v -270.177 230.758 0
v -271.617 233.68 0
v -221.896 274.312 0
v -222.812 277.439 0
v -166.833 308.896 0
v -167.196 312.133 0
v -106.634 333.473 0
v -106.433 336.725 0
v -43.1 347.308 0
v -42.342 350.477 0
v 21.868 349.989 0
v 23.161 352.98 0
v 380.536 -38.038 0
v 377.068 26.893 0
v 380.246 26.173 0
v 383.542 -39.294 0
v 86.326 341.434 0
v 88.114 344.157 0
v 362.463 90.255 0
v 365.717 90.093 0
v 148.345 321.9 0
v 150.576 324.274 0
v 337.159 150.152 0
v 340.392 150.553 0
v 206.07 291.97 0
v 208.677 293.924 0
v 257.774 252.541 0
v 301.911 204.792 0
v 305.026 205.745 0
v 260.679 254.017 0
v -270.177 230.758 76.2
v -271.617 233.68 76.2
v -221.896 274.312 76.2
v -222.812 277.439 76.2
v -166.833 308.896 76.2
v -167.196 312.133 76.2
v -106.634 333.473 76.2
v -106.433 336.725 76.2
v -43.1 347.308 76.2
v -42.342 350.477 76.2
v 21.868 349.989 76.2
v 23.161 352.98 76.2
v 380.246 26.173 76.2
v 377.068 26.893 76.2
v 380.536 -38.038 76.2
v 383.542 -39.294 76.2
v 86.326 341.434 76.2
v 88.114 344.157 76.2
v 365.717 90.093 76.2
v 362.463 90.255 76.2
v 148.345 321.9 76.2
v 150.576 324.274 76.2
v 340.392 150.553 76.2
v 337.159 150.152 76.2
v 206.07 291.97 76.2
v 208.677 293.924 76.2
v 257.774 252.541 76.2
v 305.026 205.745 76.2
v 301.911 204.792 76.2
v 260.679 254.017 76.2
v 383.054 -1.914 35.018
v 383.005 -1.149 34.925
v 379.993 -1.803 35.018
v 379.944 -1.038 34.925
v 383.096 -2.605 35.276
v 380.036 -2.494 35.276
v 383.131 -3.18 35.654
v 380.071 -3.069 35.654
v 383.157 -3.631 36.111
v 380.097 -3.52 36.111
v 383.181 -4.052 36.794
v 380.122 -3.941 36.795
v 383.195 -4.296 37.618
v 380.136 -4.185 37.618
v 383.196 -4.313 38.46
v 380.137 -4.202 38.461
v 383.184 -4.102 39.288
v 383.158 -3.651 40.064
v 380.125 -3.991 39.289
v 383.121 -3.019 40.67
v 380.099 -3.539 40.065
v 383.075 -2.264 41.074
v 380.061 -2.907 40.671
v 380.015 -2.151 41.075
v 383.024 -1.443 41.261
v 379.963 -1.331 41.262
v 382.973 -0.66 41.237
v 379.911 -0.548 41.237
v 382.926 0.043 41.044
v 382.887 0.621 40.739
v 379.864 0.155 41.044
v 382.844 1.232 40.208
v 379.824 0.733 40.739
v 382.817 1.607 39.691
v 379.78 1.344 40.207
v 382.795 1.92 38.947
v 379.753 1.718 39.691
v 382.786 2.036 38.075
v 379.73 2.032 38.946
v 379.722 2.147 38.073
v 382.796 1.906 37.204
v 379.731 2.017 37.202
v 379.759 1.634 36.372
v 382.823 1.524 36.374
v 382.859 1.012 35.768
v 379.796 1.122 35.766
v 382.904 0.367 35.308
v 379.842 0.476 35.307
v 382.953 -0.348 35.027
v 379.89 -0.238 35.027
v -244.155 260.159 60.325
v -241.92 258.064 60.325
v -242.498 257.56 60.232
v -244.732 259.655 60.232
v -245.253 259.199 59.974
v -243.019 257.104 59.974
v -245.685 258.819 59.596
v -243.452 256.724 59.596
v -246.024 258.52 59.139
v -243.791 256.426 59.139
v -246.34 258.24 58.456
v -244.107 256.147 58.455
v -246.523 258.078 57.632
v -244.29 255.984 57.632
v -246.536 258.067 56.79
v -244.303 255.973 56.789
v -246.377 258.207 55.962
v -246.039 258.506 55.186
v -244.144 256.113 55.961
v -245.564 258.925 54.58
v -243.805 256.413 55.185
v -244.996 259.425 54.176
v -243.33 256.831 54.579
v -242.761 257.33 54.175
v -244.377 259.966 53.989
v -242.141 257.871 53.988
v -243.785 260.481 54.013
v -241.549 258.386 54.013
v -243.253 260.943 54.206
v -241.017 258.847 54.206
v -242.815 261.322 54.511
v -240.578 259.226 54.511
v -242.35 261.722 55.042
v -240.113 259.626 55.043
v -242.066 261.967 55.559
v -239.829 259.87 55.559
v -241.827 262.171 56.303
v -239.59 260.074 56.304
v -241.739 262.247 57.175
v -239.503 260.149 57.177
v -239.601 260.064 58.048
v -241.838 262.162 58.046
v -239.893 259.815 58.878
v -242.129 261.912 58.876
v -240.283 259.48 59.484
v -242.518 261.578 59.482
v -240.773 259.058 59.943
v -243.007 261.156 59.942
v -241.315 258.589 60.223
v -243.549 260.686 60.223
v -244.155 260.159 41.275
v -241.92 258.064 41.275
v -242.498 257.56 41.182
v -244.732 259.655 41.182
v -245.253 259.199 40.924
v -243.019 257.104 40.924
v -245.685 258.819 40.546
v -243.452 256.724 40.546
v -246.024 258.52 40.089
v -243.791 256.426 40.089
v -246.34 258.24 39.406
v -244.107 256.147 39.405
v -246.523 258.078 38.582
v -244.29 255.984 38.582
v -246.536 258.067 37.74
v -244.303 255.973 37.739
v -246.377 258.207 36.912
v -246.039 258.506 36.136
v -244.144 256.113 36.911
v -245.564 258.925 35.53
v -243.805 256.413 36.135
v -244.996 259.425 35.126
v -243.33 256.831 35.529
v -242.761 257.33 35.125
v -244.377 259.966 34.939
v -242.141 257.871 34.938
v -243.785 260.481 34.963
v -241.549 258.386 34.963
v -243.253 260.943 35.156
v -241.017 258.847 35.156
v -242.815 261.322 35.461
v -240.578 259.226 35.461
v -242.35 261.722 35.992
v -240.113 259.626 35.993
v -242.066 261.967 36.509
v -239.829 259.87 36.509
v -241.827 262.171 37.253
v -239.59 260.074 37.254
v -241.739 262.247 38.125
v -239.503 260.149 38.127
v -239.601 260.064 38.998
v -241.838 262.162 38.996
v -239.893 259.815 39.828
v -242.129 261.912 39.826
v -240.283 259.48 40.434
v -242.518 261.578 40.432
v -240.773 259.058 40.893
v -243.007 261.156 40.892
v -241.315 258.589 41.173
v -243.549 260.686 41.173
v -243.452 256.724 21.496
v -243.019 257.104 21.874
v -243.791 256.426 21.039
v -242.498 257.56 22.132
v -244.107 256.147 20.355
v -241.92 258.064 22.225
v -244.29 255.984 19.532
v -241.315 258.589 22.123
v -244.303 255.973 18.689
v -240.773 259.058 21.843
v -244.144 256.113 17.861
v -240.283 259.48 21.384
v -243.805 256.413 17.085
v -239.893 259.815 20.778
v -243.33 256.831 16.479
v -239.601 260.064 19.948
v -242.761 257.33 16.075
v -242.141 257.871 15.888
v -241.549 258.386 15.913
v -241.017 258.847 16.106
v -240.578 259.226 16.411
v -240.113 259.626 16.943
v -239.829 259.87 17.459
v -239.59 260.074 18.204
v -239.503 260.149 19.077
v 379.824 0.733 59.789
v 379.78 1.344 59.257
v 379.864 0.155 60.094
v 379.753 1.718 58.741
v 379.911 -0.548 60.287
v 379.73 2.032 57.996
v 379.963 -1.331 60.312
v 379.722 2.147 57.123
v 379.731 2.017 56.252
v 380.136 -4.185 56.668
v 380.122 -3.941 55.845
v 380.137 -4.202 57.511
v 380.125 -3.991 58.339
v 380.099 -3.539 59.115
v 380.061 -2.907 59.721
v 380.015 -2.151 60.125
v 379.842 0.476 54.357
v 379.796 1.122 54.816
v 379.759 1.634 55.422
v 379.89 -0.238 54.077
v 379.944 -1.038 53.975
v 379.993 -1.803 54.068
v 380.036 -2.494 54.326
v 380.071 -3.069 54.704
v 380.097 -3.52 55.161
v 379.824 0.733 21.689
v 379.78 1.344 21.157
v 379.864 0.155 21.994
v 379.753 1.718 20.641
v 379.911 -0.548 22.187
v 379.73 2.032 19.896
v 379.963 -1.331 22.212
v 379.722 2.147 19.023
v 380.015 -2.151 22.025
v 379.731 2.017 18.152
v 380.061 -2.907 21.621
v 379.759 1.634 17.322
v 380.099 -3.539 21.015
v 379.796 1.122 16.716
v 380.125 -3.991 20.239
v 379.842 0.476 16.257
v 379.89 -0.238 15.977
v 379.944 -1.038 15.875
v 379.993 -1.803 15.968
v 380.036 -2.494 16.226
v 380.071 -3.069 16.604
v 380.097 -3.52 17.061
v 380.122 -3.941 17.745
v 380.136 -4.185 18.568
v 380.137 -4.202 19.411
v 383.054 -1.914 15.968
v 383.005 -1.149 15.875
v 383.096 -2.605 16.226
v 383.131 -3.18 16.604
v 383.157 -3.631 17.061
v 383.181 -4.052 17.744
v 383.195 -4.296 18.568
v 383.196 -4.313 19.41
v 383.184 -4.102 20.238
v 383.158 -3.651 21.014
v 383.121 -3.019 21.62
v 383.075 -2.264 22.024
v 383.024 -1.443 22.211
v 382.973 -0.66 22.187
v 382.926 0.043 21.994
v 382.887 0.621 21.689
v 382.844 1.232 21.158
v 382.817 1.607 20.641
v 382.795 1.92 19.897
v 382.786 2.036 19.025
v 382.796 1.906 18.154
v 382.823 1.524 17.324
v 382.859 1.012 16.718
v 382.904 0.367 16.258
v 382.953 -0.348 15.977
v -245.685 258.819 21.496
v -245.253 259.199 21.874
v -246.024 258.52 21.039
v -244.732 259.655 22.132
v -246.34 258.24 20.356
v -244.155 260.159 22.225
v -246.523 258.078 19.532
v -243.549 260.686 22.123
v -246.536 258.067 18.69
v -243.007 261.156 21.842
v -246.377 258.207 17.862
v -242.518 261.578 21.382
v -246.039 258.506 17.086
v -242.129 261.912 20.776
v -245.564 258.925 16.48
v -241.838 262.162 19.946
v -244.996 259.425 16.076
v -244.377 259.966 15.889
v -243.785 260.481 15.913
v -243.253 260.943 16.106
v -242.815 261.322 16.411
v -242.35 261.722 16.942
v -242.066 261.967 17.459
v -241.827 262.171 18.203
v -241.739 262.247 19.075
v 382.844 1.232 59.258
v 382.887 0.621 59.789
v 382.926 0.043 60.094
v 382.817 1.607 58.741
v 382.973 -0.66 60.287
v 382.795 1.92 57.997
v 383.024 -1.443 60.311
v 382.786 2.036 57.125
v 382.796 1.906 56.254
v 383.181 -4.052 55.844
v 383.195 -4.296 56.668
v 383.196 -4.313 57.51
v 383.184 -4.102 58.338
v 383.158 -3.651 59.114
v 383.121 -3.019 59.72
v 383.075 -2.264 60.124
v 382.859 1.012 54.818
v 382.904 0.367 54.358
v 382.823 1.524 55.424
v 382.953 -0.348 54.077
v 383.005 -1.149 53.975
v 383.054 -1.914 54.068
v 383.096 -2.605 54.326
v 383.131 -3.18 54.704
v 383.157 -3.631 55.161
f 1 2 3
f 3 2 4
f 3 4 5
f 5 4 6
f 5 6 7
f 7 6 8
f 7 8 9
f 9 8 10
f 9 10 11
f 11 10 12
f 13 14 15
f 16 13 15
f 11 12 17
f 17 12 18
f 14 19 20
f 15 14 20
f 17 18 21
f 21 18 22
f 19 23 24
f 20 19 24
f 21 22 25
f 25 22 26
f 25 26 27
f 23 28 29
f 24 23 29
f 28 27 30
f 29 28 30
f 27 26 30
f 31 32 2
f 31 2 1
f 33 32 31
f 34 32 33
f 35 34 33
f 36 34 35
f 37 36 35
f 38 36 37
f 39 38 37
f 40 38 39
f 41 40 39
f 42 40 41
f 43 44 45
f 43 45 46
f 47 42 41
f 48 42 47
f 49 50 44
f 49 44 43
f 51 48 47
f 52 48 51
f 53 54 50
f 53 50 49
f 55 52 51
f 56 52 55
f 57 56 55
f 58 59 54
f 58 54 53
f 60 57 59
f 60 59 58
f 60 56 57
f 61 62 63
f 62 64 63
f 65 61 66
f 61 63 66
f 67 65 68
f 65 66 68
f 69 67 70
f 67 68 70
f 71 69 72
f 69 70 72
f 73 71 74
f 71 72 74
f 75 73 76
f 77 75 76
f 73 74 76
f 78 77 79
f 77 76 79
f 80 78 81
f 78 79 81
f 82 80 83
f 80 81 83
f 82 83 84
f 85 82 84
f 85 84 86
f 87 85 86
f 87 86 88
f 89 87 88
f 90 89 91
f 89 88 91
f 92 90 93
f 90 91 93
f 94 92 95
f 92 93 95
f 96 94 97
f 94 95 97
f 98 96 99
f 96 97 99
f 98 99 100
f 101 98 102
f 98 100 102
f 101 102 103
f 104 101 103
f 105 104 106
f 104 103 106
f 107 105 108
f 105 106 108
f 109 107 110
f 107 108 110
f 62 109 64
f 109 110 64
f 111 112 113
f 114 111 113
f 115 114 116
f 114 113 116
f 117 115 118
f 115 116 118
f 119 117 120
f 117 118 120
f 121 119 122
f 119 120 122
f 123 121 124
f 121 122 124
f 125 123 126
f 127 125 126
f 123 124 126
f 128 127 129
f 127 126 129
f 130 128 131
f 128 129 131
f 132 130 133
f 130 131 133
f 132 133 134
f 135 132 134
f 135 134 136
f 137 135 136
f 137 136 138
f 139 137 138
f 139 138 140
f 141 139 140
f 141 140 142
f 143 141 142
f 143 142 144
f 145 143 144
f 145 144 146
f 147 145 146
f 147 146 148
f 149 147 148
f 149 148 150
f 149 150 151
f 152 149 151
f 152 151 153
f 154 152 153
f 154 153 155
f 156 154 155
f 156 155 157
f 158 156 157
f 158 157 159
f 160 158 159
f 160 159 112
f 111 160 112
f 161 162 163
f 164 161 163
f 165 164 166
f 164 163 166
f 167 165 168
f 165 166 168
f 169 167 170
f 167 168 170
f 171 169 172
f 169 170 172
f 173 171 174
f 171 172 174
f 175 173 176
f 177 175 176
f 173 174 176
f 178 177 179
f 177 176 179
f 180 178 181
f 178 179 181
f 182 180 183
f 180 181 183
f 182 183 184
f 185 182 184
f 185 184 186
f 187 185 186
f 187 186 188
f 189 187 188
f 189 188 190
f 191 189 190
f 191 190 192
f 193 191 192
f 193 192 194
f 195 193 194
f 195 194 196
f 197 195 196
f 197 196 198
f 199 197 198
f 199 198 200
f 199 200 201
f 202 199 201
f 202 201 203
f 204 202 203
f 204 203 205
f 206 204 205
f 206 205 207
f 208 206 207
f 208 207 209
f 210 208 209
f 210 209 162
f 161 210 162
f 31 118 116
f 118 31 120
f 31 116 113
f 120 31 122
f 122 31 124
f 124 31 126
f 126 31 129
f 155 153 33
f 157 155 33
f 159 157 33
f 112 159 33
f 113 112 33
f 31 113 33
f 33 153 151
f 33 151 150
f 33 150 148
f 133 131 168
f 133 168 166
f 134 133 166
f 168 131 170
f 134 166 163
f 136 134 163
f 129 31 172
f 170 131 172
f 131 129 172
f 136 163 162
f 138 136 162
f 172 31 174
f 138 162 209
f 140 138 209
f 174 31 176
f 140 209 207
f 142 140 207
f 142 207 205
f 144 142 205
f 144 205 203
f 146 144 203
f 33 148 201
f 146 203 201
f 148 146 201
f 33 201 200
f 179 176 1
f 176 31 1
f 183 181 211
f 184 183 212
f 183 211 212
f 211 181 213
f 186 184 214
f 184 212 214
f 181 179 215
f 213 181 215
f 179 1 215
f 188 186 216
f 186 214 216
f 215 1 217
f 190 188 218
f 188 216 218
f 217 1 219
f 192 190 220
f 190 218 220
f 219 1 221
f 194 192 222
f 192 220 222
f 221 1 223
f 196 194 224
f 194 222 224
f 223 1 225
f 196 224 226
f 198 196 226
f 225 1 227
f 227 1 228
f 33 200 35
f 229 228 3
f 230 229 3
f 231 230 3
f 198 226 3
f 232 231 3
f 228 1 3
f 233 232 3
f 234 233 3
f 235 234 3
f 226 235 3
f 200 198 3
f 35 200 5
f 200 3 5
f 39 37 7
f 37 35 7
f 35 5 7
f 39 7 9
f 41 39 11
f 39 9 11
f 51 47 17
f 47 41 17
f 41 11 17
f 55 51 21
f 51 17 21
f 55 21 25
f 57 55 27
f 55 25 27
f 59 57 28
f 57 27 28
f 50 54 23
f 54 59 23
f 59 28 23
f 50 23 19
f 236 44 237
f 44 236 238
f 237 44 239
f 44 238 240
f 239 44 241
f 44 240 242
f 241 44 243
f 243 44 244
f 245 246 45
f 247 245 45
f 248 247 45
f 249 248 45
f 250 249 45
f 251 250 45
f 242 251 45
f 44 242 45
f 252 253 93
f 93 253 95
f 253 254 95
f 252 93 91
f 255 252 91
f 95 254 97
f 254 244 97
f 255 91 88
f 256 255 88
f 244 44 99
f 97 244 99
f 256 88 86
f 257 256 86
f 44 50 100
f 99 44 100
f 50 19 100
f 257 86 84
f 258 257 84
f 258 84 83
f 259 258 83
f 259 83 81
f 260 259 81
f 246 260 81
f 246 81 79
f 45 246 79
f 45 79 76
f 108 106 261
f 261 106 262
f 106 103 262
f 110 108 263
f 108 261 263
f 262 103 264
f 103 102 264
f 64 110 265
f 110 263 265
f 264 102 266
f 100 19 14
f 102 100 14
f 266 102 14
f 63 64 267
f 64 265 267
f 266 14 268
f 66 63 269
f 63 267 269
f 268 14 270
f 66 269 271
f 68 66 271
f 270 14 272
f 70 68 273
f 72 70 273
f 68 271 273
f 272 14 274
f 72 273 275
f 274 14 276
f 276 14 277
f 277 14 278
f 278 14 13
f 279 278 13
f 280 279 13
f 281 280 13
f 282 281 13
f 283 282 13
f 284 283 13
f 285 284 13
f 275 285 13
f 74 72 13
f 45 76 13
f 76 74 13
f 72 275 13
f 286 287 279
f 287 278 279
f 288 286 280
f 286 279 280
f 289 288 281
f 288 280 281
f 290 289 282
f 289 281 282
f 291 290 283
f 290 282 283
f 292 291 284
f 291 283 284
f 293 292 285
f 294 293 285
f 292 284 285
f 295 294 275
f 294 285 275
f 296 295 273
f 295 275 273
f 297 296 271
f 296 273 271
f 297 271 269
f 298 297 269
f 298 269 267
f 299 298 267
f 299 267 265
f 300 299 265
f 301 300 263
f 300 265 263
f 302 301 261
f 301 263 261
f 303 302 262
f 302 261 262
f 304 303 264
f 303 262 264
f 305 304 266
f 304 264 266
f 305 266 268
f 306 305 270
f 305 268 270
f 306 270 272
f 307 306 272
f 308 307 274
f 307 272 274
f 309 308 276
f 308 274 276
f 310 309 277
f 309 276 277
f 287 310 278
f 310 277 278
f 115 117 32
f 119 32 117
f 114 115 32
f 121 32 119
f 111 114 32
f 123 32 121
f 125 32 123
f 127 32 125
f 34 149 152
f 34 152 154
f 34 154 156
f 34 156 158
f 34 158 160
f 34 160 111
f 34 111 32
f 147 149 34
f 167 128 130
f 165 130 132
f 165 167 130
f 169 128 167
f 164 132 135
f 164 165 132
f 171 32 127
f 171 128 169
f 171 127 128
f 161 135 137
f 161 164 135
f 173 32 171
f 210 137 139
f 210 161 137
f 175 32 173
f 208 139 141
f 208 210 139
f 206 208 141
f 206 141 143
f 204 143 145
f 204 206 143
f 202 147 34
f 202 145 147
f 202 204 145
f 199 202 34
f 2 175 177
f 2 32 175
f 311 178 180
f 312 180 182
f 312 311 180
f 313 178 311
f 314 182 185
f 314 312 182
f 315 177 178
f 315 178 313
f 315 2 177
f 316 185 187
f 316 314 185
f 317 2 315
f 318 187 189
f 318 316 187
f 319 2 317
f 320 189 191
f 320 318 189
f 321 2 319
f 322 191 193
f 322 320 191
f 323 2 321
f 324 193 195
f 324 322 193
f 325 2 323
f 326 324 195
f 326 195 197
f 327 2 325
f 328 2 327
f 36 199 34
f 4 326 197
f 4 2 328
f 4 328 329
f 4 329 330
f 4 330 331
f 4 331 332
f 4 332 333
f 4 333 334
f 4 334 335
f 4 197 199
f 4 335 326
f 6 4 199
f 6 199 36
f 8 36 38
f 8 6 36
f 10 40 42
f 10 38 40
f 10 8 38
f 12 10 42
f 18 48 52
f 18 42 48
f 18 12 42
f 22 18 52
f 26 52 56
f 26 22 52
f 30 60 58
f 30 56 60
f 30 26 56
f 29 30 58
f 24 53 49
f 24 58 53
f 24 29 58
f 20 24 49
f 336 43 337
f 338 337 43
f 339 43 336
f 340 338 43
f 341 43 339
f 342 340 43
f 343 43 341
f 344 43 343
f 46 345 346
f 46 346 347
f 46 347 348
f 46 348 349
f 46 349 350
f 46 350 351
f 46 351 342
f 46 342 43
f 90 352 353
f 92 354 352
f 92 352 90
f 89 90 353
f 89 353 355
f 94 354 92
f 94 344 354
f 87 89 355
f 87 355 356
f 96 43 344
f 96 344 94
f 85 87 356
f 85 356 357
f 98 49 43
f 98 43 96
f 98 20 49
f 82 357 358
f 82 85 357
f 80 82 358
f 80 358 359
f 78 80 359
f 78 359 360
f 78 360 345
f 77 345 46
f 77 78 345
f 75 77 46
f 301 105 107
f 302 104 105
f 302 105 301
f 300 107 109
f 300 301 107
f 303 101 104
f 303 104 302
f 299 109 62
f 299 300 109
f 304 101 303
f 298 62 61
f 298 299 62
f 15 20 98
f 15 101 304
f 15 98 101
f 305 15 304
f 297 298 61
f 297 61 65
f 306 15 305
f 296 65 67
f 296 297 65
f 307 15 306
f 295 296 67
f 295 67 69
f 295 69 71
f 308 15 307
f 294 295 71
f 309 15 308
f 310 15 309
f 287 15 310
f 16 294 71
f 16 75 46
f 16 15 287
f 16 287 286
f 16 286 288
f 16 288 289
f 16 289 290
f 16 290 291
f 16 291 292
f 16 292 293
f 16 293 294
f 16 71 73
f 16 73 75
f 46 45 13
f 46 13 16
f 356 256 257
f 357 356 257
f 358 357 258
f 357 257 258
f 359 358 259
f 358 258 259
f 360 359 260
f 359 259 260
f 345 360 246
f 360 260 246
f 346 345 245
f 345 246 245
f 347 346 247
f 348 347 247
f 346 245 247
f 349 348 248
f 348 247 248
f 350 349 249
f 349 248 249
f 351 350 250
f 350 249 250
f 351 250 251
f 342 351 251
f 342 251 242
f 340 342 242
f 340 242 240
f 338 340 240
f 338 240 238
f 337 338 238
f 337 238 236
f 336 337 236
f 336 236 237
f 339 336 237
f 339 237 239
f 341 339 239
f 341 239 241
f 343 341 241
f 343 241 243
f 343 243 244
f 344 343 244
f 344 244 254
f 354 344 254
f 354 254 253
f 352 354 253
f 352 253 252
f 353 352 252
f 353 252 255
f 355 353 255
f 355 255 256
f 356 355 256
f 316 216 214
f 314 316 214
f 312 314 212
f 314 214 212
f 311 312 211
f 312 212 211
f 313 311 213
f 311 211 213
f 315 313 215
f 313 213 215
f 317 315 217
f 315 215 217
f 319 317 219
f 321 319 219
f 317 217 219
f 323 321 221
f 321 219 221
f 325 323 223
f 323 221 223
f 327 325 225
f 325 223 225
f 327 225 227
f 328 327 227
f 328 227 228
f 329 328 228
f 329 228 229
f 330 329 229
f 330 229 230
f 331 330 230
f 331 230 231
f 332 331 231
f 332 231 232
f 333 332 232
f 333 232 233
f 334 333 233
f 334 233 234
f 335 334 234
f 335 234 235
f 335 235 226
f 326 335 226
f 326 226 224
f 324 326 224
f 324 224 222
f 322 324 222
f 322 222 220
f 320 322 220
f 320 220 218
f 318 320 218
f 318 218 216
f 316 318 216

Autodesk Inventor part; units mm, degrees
ref_plane "YZ Plane" through (0, 0, 0) normal (1, 0, 0) x (0, 1, 0)
sketch "Sketch1" plane through (0, 0, 0) normal (0, 0, 1) x (1, 0, 0)
  arc A0 (380.5355, -38.0375) -> (-270.1768, 230.7579) centre (4.8231, -25.5444) ccw
  arc A1 (383.5416, -39.2939) -> (-271.6172, 233.6803) centre (4.8231, -25.5444) ccw
  line L0 (-271.6172, 233.6803) -> (-270.1768, 230.7579)
  line L1 (380.5355, -38.0375) -> (383.5416, -39.2939)
  point P0 (0, 0)
  dimension "d0" = 375.92
  dimension "d1" = 138.92
  dimension "d3" = 138.92
  dimension "d4" = 378.968
extrude "Extrusion1" add sketch "Sketch1" along normal blind 76.2
ref_plane "Work Plane3" through (383.5416, -39.2939, 0) normal (0.9993, -0.0363, 0) x (0.0363, 0.9993, 0)
ref_plane "Work Plane4" through (-271.6172, 233.6803, 0) normal (-0.7295, 0.684, 0) x (-0.684, -0.7295, 0)
sketch "Sketch2" plane through (383.5416, -39.2939, 0) normal (0.9993, -0.0363, 0) x (0.0363, 0.9993, 0)
  line L0 (249.0245, 76.2) -> (0, 76.2) projected
  line L1 (0, 0) -> (0, 76.2) projected
  line L2 (249.0245, 0) -> (0, 0) projected
  line L3 (249.0245, 0) -> (249.0245, 76.2) projected
  point P0 (25.3526, 0)
  point P1 (38.1, 57.15)
  point P2 (38.1, 38.1)
  point P3 (38.1, 19.05)
  dimension "d7" = 38.1
  dimension "d8" = 38.1
  dimension "d9" = 38.1
  dimension "d10" = 19.05
  dimension "d11" = 38.1
  dimension "d12" = 57.15
sketch "Sketch3" plane through (-271.6172, 233.6803, 0) normal (-0.7295, 0.684, 0) x (-0.684, -0.7295, 0)
  line L0 (0, 0) -> (0, 76.2) projected
  line L1 (-378.968, 0) -> (0, 0) projected
  point P0 (-15.3344, 0)
  point P1 (-38.1, 19.05)
  point P2 (-38.1, 38.1)
  point P3 (-38.1, 57.15)
  point P4 (-249.0245, 0)
  dimension "d13" = 38.1
  dimension "d14" = 38.1
  dimension "d15" = 38.1
  dimension "d16" = 19.05
  dimension "d17" = 38.1
  dimension "d18" = 57.15
hole "Hole1" at (-245.5557, 261.4726, 57.15) at (-245.5557, 261.4726, 38.1) at (-245.5557, 261.4726, 19.05) direction (0.7295, -0.684, 0) diameter 6.35 depth 25.4 tip angle 118
hole "Hole2" at (384.924, -1.219, 57.15) at (384.924, -1.219, 38.1) at (384.924, -1.219, 19.05) direction (-0.9993, 0.0363, 0) diameter 6.35 depth 25.4 tip angle 118
thread "Thread1" size "1/4-20 UNC" class "2B" standard "ANSI Unified Screw Threads" full length
thread "Thread2" size "1/4-20 UNC" class "2B" standard "ANSI Unified Screw Threads" full length
thread "Thread3" size "1/4-20 UNC" class "2B" standard "ANSI Unified Screw Threads" full length
thread "Thread4" size "1/4-20 UNC" class "2B" standard "ANSI Unified Screw Threads" full length
thread "Thread5" size "1/4-20 UNC" class "2B" standard "ANSI Unified Screw Threads" full length
thread "Thread6" size "1/4-20 UNC" class "2B" standard "ANSI Unified Screw Threads" full length
equation "\"d3\" = d1"
properties part number "curvedTrack"
